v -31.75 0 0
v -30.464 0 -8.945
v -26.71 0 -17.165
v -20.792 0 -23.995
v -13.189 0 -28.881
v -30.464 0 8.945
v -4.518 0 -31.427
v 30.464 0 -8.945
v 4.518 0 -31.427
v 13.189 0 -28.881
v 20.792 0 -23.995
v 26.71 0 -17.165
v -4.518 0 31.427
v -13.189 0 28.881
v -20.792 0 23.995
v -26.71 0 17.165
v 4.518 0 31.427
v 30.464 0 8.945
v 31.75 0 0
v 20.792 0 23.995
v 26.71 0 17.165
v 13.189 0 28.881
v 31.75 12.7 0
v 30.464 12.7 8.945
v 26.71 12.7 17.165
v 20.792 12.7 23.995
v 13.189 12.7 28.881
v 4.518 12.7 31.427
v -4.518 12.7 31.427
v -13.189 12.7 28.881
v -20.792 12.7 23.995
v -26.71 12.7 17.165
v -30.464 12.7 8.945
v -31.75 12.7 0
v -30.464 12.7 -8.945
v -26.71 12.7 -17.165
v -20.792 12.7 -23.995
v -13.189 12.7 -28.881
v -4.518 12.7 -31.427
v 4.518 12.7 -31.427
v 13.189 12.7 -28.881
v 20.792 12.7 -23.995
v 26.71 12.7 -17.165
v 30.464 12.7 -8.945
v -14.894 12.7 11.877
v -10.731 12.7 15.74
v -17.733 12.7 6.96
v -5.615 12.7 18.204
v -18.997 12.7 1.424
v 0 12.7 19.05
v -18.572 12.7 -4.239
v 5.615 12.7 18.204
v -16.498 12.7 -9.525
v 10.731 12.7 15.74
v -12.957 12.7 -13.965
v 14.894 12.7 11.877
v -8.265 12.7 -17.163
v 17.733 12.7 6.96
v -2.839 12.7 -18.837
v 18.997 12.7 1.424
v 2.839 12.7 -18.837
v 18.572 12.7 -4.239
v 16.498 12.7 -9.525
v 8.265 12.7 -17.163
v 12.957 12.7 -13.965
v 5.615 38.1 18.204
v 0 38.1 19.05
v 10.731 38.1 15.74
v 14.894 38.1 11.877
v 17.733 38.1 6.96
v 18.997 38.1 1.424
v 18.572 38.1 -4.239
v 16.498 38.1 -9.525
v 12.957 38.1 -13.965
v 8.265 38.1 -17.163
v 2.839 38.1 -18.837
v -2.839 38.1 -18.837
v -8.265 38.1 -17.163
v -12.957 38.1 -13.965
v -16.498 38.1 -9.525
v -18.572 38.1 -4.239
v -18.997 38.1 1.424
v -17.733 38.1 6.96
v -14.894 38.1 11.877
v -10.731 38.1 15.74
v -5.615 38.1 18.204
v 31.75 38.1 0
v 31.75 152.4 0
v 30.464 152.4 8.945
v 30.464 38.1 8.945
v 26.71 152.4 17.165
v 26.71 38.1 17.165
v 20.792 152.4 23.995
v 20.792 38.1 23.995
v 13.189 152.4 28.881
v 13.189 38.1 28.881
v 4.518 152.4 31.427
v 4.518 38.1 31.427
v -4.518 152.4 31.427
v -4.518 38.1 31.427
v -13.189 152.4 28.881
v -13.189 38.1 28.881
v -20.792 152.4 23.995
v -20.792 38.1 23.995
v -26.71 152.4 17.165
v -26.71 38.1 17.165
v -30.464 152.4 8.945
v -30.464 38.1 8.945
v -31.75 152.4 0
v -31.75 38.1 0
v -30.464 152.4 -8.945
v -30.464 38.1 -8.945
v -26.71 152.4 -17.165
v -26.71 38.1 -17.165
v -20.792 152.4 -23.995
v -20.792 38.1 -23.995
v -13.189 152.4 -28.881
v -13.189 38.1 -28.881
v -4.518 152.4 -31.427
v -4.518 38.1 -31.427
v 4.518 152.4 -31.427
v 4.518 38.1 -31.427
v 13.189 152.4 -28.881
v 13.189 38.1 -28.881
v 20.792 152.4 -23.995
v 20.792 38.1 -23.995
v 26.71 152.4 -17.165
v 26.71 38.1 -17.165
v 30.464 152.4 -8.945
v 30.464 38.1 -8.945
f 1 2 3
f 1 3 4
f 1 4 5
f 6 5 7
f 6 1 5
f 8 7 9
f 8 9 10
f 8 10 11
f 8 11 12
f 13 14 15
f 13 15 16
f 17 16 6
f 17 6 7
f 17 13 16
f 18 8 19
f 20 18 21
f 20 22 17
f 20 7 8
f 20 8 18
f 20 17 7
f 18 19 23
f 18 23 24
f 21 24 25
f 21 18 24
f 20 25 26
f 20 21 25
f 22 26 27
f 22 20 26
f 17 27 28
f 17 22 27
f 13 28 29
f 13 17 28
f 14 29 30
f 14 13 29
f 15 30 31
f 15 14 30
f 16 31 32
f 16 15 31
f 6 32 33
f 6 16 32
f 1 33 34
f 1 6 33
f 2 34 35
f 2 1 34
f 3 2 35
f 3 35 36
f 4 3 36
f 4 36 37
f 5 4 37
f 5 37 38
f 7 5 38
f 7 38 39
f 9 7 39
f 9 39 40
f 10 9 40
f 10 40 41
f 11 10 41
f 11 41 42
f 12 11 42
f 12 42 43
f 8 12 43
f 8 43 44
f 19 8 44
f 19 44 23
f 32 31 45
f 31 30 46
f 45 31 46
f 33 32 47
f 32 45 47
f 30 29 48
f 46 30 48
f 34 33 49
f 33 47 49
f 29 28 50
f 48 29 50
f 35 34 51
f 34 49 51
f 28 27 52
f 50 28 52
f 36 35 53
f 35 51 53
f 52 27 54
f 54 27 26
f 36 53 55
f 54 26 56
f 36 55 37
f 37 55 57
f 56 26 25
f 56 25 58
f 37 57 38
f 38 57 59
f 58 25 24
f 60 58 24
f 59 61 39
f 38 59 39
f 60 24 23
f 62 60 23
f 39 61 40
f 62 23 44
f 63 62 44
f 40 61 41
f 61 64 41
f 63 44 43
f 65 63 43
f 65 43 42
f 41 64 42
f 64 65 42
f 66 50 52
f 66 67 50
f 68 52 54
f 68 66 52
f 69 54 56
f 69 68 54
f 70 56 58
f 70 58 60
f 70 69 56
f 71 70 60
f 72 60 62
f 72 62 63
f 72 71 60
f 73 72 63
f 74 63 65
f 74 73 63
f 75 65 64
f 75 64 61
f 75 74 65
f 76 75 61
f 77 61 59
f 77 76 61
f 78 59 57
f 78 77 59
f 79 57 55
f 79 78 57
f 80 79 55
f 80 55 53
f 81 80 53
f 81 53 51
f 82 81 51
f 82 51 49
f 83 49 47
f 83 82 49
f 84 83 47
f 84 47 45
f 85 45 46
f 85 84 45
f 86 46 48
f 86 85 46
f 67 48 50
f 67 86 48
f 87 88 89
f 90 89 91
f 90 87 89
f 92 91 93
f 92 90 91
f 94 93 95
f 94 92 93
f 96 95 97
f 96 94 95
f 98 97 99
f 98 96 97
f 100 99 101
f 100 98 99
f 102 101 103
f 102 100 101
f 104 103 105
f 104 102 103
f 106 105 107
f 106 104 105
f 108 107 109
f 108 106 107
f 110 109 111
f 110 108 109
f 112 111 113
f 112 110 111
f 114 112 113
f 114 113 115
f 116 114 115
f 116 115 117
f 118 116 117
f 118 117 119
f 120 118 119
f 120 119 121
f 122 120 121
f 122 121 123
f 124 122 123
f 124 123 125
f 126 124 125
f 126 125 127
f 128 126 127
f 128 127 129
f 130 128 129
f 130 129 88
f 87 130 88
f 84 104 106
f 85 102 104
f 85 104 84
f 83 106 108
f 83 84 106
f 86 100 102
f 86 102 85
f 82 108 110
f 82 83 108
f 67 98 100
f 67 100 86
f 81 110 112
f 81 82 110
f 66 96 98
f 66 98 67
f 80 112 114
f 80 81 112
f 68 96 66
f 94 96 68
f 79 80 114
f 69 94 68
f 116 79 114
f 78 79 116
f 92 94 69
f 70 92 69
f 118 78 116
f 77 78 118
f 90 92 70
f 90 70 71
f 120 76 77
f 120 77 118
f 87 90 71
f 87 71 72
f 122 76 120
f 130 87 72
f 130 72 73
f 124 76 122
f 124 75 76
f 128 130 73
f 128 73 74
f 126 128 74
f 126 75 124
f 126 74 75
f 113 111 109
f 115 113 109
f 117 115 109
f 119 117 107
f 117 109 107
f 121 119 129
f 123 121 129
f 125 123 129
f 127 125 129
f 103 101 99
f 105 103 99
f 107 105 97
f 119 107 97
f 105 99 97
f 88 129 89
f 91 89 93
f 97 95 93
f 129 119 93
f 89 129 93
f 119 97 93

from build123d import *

# Parameters (mm, degrees)
F0_R     = 31.75
F1_DEPTH = 152.4
F2_W     = 25.4
F2_H     = 12.7


with BuildPart() as f1:
    # F0 (on Front) → F1 (new body)
    with BuildSketch(Plane.XZ):
        Circle(F0_R)
    extrude(amount=-F1_DEPTH)

    # F2 (on Right) → F3 (revolve, cut)
    with BuildSketch(Plane.YZ):
        with Locations((25.4, 25.4)):
            Rectangle(F2_W, F2_H)
    revolve(axis=Axis((0, 76.5412002802, 0), (0, 1, 0)), mode=Mode.SUBTRACT)


solid = f1.part
